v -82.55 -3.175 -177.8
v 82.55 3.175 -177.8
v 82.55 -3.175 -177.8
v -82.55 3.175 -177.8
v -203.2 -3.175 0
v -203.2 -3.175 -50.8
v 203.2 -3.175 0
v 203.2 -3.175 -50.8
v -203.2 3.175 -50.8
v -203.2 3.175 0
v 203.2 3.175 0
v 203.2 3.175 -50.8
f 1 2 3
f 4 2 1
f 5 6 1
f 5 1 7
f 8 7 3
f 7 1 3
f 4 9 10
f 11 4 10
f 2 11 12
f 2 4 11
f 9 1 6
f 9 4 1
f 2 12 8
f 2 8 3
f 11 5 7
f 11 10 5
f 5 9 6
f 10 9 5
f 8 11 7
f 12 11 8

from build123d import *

# Parameters (mm, degrees)
BOSS_EXTRUDE1_DEPTH = 3.175


with BuildPart() as part:
    # Sketch1 → Boss-Extrude1 (new body, symmetric)
    with BuildSketch(Plane(origin=(0, 0, 0), x_dir=(1, 0, 0), z_dir=(0, 1, 0))):
        Polygon((-203.2, 0), (203.2, 0), (203.2, 50.8), (82.55, 177.8), (-82.55, 177.8), (-203.2, 50.8), align=None)
    extrude(amount=BOSS_EXTRUDE1_DEPTH, both=True)


solid = part.part
